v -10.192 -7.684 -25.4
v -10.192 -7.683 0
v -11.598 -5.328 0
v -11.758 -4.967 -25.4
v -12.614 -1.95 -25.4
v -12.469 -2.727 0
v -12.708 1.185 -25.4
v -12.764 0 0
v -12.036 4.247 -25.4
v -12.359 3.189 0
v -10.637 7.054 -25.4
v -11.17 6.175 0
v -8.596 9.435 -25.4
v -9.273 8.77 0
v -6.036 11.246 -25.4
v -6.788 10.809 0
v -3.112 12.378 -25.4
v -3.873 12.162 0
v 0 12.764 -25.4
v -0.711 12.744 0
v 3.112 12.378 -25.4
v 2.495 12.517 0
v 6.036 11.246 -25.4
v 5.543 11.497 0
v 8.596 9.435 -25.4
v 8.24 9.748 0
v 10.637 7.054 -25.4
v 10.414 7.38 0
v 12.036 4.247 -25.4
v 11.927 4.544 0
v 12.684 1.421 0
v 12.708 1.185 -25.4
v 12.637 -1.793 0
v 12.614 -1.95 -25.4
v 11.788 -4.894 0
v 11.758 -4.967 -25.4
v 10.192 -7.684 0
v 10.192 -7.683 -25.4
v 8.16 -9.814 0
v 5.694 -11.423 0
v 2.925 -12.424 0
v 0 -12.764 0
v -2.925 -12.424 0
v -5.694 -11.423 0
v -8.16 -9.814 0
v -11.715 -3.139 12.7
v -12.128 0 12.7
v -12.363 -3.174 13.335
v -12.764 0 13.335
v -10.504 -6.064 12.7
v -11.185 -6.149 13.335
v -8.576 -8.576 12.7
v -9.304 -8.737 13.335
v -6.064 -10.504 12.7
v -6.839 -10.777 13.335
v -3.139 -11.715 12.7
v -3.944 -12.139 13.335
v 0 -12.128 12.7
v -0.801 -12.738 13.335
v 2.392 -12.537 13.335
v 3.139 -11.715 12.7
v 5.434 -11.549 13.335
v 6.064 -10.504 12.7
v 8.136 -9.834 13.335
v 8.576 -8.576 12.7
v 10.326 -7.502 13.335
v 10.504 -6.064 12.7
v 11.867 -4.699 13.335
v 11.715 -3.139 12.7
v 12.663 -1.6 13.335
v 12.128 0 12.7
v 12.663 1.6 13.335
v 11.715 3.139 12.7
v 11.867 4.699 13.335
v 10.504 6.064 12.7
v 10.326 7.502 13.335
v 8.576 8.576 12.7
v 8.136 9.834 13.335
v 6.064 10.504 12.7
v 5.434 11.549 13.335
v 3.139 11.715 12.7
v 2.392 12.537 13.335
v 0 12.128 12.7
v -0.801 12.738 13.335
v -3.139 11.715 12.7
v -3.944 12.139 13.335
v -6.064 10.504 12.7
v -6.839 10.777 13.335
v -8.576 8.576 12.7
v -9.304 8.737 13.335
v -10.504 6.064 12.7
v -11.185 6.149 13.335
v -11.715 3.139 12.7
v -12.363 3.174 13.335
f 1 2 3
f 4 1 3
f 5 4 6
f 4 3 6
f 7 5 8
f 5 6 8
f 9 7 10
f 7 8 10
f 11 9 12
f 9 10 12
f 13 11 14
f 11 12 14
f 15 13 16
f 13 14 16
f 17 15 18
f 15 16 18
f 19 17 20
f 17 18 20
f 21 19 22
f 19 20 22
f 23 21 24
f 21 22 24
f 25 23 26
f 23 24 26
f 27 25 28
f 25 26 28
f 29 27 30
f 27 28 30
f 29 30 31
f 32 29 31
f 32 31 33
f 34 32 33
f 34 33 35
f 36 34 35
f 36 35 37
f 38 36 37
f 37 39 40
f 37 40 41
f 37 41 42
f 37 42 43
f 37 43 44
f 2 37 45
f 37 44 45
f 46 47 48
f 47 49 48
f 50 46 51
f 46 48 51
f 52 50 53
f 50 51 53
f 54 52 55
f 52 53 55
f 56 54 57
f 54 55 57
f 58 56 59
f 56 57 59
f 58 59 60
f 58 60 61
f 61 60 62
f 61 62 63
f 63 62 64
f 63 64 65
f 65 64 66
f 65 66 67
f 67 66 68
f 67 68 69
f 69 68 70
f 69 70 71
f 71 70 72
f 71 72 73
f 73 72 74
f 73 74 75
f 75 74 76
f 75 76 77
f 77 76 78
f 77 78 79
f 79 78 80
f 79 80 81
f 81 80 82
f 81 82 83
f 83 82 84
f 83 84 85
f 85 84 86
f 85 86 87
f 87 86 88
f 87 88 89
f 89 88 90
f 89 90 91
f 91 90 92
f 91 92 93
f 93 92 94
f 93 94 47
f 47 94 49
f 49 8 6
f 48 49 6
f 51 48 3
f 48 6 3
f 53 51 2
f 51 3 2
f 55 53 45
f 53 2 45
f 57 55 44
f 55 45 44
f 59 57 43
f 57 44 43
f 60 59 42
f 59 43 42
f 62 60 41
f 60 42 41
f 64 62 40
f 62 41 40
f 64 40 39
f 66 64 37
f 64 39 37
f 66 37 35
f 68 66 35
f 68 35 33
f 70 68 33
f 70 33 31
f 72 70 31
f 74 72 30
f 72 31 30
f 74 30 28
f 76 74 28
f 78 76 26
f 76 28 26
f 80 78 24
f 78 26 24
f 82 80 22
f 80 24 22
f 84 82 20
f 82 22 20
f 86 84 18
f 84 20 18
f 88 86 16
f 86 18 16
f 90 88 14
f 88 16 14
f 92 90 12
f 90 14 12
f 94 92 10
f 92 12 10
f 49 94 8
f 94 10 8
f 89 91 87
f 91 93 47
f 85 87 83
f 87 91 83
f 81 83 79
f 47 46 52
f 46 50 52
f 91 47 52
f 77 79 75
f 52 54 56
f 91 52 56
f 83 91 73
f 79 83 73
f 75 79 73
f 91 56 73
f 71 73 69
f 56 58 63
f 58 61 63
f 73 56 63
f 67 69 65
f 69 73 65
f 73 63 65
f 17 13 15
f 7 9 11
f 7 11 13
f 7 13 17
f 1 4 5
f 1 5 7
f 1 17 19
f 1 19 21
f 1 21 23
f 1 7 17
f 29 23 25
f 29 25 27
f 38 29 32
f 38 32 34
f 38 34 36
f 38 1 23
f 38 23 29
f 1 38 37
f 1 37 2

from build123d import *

# Parameters (mm, degrees)
F3_DEPTH = 25.4


with BuildPart() as f1:
    # F0 (on Front) → F1 (revolve)
    with BuildSketch(Plane.XZ):
        Polygon((-12.7635, 0), (0, 0), (0, 12.7), (-12.1285, 12.7), (-12.7635, 12.7), align=None)
        Polygon((-12.7635, 12.7), (-12.1285, 12.7), (-12.7635, 13.335), align=None)
    revolve(axis=Axis((0, 0, 6.35), (0, 0, 1)))

    # F2 (on face) → F3 (join)
    with BuildSketch(Plane(origin=(0, 0, 0), x_dir=(1, 0, 0), z_dir=(0, 0, -1))):
        with BuildLine():
            Line((10.191701, 7.6835), (-10.191701, 7.6835))
            ThreePointArc((-10.191701, 7.6835), (0, -12.7635), (10.191701, 7.6835))
        make_face()
    extrude(amount=F3_DEPTH)


solid = f1.part
